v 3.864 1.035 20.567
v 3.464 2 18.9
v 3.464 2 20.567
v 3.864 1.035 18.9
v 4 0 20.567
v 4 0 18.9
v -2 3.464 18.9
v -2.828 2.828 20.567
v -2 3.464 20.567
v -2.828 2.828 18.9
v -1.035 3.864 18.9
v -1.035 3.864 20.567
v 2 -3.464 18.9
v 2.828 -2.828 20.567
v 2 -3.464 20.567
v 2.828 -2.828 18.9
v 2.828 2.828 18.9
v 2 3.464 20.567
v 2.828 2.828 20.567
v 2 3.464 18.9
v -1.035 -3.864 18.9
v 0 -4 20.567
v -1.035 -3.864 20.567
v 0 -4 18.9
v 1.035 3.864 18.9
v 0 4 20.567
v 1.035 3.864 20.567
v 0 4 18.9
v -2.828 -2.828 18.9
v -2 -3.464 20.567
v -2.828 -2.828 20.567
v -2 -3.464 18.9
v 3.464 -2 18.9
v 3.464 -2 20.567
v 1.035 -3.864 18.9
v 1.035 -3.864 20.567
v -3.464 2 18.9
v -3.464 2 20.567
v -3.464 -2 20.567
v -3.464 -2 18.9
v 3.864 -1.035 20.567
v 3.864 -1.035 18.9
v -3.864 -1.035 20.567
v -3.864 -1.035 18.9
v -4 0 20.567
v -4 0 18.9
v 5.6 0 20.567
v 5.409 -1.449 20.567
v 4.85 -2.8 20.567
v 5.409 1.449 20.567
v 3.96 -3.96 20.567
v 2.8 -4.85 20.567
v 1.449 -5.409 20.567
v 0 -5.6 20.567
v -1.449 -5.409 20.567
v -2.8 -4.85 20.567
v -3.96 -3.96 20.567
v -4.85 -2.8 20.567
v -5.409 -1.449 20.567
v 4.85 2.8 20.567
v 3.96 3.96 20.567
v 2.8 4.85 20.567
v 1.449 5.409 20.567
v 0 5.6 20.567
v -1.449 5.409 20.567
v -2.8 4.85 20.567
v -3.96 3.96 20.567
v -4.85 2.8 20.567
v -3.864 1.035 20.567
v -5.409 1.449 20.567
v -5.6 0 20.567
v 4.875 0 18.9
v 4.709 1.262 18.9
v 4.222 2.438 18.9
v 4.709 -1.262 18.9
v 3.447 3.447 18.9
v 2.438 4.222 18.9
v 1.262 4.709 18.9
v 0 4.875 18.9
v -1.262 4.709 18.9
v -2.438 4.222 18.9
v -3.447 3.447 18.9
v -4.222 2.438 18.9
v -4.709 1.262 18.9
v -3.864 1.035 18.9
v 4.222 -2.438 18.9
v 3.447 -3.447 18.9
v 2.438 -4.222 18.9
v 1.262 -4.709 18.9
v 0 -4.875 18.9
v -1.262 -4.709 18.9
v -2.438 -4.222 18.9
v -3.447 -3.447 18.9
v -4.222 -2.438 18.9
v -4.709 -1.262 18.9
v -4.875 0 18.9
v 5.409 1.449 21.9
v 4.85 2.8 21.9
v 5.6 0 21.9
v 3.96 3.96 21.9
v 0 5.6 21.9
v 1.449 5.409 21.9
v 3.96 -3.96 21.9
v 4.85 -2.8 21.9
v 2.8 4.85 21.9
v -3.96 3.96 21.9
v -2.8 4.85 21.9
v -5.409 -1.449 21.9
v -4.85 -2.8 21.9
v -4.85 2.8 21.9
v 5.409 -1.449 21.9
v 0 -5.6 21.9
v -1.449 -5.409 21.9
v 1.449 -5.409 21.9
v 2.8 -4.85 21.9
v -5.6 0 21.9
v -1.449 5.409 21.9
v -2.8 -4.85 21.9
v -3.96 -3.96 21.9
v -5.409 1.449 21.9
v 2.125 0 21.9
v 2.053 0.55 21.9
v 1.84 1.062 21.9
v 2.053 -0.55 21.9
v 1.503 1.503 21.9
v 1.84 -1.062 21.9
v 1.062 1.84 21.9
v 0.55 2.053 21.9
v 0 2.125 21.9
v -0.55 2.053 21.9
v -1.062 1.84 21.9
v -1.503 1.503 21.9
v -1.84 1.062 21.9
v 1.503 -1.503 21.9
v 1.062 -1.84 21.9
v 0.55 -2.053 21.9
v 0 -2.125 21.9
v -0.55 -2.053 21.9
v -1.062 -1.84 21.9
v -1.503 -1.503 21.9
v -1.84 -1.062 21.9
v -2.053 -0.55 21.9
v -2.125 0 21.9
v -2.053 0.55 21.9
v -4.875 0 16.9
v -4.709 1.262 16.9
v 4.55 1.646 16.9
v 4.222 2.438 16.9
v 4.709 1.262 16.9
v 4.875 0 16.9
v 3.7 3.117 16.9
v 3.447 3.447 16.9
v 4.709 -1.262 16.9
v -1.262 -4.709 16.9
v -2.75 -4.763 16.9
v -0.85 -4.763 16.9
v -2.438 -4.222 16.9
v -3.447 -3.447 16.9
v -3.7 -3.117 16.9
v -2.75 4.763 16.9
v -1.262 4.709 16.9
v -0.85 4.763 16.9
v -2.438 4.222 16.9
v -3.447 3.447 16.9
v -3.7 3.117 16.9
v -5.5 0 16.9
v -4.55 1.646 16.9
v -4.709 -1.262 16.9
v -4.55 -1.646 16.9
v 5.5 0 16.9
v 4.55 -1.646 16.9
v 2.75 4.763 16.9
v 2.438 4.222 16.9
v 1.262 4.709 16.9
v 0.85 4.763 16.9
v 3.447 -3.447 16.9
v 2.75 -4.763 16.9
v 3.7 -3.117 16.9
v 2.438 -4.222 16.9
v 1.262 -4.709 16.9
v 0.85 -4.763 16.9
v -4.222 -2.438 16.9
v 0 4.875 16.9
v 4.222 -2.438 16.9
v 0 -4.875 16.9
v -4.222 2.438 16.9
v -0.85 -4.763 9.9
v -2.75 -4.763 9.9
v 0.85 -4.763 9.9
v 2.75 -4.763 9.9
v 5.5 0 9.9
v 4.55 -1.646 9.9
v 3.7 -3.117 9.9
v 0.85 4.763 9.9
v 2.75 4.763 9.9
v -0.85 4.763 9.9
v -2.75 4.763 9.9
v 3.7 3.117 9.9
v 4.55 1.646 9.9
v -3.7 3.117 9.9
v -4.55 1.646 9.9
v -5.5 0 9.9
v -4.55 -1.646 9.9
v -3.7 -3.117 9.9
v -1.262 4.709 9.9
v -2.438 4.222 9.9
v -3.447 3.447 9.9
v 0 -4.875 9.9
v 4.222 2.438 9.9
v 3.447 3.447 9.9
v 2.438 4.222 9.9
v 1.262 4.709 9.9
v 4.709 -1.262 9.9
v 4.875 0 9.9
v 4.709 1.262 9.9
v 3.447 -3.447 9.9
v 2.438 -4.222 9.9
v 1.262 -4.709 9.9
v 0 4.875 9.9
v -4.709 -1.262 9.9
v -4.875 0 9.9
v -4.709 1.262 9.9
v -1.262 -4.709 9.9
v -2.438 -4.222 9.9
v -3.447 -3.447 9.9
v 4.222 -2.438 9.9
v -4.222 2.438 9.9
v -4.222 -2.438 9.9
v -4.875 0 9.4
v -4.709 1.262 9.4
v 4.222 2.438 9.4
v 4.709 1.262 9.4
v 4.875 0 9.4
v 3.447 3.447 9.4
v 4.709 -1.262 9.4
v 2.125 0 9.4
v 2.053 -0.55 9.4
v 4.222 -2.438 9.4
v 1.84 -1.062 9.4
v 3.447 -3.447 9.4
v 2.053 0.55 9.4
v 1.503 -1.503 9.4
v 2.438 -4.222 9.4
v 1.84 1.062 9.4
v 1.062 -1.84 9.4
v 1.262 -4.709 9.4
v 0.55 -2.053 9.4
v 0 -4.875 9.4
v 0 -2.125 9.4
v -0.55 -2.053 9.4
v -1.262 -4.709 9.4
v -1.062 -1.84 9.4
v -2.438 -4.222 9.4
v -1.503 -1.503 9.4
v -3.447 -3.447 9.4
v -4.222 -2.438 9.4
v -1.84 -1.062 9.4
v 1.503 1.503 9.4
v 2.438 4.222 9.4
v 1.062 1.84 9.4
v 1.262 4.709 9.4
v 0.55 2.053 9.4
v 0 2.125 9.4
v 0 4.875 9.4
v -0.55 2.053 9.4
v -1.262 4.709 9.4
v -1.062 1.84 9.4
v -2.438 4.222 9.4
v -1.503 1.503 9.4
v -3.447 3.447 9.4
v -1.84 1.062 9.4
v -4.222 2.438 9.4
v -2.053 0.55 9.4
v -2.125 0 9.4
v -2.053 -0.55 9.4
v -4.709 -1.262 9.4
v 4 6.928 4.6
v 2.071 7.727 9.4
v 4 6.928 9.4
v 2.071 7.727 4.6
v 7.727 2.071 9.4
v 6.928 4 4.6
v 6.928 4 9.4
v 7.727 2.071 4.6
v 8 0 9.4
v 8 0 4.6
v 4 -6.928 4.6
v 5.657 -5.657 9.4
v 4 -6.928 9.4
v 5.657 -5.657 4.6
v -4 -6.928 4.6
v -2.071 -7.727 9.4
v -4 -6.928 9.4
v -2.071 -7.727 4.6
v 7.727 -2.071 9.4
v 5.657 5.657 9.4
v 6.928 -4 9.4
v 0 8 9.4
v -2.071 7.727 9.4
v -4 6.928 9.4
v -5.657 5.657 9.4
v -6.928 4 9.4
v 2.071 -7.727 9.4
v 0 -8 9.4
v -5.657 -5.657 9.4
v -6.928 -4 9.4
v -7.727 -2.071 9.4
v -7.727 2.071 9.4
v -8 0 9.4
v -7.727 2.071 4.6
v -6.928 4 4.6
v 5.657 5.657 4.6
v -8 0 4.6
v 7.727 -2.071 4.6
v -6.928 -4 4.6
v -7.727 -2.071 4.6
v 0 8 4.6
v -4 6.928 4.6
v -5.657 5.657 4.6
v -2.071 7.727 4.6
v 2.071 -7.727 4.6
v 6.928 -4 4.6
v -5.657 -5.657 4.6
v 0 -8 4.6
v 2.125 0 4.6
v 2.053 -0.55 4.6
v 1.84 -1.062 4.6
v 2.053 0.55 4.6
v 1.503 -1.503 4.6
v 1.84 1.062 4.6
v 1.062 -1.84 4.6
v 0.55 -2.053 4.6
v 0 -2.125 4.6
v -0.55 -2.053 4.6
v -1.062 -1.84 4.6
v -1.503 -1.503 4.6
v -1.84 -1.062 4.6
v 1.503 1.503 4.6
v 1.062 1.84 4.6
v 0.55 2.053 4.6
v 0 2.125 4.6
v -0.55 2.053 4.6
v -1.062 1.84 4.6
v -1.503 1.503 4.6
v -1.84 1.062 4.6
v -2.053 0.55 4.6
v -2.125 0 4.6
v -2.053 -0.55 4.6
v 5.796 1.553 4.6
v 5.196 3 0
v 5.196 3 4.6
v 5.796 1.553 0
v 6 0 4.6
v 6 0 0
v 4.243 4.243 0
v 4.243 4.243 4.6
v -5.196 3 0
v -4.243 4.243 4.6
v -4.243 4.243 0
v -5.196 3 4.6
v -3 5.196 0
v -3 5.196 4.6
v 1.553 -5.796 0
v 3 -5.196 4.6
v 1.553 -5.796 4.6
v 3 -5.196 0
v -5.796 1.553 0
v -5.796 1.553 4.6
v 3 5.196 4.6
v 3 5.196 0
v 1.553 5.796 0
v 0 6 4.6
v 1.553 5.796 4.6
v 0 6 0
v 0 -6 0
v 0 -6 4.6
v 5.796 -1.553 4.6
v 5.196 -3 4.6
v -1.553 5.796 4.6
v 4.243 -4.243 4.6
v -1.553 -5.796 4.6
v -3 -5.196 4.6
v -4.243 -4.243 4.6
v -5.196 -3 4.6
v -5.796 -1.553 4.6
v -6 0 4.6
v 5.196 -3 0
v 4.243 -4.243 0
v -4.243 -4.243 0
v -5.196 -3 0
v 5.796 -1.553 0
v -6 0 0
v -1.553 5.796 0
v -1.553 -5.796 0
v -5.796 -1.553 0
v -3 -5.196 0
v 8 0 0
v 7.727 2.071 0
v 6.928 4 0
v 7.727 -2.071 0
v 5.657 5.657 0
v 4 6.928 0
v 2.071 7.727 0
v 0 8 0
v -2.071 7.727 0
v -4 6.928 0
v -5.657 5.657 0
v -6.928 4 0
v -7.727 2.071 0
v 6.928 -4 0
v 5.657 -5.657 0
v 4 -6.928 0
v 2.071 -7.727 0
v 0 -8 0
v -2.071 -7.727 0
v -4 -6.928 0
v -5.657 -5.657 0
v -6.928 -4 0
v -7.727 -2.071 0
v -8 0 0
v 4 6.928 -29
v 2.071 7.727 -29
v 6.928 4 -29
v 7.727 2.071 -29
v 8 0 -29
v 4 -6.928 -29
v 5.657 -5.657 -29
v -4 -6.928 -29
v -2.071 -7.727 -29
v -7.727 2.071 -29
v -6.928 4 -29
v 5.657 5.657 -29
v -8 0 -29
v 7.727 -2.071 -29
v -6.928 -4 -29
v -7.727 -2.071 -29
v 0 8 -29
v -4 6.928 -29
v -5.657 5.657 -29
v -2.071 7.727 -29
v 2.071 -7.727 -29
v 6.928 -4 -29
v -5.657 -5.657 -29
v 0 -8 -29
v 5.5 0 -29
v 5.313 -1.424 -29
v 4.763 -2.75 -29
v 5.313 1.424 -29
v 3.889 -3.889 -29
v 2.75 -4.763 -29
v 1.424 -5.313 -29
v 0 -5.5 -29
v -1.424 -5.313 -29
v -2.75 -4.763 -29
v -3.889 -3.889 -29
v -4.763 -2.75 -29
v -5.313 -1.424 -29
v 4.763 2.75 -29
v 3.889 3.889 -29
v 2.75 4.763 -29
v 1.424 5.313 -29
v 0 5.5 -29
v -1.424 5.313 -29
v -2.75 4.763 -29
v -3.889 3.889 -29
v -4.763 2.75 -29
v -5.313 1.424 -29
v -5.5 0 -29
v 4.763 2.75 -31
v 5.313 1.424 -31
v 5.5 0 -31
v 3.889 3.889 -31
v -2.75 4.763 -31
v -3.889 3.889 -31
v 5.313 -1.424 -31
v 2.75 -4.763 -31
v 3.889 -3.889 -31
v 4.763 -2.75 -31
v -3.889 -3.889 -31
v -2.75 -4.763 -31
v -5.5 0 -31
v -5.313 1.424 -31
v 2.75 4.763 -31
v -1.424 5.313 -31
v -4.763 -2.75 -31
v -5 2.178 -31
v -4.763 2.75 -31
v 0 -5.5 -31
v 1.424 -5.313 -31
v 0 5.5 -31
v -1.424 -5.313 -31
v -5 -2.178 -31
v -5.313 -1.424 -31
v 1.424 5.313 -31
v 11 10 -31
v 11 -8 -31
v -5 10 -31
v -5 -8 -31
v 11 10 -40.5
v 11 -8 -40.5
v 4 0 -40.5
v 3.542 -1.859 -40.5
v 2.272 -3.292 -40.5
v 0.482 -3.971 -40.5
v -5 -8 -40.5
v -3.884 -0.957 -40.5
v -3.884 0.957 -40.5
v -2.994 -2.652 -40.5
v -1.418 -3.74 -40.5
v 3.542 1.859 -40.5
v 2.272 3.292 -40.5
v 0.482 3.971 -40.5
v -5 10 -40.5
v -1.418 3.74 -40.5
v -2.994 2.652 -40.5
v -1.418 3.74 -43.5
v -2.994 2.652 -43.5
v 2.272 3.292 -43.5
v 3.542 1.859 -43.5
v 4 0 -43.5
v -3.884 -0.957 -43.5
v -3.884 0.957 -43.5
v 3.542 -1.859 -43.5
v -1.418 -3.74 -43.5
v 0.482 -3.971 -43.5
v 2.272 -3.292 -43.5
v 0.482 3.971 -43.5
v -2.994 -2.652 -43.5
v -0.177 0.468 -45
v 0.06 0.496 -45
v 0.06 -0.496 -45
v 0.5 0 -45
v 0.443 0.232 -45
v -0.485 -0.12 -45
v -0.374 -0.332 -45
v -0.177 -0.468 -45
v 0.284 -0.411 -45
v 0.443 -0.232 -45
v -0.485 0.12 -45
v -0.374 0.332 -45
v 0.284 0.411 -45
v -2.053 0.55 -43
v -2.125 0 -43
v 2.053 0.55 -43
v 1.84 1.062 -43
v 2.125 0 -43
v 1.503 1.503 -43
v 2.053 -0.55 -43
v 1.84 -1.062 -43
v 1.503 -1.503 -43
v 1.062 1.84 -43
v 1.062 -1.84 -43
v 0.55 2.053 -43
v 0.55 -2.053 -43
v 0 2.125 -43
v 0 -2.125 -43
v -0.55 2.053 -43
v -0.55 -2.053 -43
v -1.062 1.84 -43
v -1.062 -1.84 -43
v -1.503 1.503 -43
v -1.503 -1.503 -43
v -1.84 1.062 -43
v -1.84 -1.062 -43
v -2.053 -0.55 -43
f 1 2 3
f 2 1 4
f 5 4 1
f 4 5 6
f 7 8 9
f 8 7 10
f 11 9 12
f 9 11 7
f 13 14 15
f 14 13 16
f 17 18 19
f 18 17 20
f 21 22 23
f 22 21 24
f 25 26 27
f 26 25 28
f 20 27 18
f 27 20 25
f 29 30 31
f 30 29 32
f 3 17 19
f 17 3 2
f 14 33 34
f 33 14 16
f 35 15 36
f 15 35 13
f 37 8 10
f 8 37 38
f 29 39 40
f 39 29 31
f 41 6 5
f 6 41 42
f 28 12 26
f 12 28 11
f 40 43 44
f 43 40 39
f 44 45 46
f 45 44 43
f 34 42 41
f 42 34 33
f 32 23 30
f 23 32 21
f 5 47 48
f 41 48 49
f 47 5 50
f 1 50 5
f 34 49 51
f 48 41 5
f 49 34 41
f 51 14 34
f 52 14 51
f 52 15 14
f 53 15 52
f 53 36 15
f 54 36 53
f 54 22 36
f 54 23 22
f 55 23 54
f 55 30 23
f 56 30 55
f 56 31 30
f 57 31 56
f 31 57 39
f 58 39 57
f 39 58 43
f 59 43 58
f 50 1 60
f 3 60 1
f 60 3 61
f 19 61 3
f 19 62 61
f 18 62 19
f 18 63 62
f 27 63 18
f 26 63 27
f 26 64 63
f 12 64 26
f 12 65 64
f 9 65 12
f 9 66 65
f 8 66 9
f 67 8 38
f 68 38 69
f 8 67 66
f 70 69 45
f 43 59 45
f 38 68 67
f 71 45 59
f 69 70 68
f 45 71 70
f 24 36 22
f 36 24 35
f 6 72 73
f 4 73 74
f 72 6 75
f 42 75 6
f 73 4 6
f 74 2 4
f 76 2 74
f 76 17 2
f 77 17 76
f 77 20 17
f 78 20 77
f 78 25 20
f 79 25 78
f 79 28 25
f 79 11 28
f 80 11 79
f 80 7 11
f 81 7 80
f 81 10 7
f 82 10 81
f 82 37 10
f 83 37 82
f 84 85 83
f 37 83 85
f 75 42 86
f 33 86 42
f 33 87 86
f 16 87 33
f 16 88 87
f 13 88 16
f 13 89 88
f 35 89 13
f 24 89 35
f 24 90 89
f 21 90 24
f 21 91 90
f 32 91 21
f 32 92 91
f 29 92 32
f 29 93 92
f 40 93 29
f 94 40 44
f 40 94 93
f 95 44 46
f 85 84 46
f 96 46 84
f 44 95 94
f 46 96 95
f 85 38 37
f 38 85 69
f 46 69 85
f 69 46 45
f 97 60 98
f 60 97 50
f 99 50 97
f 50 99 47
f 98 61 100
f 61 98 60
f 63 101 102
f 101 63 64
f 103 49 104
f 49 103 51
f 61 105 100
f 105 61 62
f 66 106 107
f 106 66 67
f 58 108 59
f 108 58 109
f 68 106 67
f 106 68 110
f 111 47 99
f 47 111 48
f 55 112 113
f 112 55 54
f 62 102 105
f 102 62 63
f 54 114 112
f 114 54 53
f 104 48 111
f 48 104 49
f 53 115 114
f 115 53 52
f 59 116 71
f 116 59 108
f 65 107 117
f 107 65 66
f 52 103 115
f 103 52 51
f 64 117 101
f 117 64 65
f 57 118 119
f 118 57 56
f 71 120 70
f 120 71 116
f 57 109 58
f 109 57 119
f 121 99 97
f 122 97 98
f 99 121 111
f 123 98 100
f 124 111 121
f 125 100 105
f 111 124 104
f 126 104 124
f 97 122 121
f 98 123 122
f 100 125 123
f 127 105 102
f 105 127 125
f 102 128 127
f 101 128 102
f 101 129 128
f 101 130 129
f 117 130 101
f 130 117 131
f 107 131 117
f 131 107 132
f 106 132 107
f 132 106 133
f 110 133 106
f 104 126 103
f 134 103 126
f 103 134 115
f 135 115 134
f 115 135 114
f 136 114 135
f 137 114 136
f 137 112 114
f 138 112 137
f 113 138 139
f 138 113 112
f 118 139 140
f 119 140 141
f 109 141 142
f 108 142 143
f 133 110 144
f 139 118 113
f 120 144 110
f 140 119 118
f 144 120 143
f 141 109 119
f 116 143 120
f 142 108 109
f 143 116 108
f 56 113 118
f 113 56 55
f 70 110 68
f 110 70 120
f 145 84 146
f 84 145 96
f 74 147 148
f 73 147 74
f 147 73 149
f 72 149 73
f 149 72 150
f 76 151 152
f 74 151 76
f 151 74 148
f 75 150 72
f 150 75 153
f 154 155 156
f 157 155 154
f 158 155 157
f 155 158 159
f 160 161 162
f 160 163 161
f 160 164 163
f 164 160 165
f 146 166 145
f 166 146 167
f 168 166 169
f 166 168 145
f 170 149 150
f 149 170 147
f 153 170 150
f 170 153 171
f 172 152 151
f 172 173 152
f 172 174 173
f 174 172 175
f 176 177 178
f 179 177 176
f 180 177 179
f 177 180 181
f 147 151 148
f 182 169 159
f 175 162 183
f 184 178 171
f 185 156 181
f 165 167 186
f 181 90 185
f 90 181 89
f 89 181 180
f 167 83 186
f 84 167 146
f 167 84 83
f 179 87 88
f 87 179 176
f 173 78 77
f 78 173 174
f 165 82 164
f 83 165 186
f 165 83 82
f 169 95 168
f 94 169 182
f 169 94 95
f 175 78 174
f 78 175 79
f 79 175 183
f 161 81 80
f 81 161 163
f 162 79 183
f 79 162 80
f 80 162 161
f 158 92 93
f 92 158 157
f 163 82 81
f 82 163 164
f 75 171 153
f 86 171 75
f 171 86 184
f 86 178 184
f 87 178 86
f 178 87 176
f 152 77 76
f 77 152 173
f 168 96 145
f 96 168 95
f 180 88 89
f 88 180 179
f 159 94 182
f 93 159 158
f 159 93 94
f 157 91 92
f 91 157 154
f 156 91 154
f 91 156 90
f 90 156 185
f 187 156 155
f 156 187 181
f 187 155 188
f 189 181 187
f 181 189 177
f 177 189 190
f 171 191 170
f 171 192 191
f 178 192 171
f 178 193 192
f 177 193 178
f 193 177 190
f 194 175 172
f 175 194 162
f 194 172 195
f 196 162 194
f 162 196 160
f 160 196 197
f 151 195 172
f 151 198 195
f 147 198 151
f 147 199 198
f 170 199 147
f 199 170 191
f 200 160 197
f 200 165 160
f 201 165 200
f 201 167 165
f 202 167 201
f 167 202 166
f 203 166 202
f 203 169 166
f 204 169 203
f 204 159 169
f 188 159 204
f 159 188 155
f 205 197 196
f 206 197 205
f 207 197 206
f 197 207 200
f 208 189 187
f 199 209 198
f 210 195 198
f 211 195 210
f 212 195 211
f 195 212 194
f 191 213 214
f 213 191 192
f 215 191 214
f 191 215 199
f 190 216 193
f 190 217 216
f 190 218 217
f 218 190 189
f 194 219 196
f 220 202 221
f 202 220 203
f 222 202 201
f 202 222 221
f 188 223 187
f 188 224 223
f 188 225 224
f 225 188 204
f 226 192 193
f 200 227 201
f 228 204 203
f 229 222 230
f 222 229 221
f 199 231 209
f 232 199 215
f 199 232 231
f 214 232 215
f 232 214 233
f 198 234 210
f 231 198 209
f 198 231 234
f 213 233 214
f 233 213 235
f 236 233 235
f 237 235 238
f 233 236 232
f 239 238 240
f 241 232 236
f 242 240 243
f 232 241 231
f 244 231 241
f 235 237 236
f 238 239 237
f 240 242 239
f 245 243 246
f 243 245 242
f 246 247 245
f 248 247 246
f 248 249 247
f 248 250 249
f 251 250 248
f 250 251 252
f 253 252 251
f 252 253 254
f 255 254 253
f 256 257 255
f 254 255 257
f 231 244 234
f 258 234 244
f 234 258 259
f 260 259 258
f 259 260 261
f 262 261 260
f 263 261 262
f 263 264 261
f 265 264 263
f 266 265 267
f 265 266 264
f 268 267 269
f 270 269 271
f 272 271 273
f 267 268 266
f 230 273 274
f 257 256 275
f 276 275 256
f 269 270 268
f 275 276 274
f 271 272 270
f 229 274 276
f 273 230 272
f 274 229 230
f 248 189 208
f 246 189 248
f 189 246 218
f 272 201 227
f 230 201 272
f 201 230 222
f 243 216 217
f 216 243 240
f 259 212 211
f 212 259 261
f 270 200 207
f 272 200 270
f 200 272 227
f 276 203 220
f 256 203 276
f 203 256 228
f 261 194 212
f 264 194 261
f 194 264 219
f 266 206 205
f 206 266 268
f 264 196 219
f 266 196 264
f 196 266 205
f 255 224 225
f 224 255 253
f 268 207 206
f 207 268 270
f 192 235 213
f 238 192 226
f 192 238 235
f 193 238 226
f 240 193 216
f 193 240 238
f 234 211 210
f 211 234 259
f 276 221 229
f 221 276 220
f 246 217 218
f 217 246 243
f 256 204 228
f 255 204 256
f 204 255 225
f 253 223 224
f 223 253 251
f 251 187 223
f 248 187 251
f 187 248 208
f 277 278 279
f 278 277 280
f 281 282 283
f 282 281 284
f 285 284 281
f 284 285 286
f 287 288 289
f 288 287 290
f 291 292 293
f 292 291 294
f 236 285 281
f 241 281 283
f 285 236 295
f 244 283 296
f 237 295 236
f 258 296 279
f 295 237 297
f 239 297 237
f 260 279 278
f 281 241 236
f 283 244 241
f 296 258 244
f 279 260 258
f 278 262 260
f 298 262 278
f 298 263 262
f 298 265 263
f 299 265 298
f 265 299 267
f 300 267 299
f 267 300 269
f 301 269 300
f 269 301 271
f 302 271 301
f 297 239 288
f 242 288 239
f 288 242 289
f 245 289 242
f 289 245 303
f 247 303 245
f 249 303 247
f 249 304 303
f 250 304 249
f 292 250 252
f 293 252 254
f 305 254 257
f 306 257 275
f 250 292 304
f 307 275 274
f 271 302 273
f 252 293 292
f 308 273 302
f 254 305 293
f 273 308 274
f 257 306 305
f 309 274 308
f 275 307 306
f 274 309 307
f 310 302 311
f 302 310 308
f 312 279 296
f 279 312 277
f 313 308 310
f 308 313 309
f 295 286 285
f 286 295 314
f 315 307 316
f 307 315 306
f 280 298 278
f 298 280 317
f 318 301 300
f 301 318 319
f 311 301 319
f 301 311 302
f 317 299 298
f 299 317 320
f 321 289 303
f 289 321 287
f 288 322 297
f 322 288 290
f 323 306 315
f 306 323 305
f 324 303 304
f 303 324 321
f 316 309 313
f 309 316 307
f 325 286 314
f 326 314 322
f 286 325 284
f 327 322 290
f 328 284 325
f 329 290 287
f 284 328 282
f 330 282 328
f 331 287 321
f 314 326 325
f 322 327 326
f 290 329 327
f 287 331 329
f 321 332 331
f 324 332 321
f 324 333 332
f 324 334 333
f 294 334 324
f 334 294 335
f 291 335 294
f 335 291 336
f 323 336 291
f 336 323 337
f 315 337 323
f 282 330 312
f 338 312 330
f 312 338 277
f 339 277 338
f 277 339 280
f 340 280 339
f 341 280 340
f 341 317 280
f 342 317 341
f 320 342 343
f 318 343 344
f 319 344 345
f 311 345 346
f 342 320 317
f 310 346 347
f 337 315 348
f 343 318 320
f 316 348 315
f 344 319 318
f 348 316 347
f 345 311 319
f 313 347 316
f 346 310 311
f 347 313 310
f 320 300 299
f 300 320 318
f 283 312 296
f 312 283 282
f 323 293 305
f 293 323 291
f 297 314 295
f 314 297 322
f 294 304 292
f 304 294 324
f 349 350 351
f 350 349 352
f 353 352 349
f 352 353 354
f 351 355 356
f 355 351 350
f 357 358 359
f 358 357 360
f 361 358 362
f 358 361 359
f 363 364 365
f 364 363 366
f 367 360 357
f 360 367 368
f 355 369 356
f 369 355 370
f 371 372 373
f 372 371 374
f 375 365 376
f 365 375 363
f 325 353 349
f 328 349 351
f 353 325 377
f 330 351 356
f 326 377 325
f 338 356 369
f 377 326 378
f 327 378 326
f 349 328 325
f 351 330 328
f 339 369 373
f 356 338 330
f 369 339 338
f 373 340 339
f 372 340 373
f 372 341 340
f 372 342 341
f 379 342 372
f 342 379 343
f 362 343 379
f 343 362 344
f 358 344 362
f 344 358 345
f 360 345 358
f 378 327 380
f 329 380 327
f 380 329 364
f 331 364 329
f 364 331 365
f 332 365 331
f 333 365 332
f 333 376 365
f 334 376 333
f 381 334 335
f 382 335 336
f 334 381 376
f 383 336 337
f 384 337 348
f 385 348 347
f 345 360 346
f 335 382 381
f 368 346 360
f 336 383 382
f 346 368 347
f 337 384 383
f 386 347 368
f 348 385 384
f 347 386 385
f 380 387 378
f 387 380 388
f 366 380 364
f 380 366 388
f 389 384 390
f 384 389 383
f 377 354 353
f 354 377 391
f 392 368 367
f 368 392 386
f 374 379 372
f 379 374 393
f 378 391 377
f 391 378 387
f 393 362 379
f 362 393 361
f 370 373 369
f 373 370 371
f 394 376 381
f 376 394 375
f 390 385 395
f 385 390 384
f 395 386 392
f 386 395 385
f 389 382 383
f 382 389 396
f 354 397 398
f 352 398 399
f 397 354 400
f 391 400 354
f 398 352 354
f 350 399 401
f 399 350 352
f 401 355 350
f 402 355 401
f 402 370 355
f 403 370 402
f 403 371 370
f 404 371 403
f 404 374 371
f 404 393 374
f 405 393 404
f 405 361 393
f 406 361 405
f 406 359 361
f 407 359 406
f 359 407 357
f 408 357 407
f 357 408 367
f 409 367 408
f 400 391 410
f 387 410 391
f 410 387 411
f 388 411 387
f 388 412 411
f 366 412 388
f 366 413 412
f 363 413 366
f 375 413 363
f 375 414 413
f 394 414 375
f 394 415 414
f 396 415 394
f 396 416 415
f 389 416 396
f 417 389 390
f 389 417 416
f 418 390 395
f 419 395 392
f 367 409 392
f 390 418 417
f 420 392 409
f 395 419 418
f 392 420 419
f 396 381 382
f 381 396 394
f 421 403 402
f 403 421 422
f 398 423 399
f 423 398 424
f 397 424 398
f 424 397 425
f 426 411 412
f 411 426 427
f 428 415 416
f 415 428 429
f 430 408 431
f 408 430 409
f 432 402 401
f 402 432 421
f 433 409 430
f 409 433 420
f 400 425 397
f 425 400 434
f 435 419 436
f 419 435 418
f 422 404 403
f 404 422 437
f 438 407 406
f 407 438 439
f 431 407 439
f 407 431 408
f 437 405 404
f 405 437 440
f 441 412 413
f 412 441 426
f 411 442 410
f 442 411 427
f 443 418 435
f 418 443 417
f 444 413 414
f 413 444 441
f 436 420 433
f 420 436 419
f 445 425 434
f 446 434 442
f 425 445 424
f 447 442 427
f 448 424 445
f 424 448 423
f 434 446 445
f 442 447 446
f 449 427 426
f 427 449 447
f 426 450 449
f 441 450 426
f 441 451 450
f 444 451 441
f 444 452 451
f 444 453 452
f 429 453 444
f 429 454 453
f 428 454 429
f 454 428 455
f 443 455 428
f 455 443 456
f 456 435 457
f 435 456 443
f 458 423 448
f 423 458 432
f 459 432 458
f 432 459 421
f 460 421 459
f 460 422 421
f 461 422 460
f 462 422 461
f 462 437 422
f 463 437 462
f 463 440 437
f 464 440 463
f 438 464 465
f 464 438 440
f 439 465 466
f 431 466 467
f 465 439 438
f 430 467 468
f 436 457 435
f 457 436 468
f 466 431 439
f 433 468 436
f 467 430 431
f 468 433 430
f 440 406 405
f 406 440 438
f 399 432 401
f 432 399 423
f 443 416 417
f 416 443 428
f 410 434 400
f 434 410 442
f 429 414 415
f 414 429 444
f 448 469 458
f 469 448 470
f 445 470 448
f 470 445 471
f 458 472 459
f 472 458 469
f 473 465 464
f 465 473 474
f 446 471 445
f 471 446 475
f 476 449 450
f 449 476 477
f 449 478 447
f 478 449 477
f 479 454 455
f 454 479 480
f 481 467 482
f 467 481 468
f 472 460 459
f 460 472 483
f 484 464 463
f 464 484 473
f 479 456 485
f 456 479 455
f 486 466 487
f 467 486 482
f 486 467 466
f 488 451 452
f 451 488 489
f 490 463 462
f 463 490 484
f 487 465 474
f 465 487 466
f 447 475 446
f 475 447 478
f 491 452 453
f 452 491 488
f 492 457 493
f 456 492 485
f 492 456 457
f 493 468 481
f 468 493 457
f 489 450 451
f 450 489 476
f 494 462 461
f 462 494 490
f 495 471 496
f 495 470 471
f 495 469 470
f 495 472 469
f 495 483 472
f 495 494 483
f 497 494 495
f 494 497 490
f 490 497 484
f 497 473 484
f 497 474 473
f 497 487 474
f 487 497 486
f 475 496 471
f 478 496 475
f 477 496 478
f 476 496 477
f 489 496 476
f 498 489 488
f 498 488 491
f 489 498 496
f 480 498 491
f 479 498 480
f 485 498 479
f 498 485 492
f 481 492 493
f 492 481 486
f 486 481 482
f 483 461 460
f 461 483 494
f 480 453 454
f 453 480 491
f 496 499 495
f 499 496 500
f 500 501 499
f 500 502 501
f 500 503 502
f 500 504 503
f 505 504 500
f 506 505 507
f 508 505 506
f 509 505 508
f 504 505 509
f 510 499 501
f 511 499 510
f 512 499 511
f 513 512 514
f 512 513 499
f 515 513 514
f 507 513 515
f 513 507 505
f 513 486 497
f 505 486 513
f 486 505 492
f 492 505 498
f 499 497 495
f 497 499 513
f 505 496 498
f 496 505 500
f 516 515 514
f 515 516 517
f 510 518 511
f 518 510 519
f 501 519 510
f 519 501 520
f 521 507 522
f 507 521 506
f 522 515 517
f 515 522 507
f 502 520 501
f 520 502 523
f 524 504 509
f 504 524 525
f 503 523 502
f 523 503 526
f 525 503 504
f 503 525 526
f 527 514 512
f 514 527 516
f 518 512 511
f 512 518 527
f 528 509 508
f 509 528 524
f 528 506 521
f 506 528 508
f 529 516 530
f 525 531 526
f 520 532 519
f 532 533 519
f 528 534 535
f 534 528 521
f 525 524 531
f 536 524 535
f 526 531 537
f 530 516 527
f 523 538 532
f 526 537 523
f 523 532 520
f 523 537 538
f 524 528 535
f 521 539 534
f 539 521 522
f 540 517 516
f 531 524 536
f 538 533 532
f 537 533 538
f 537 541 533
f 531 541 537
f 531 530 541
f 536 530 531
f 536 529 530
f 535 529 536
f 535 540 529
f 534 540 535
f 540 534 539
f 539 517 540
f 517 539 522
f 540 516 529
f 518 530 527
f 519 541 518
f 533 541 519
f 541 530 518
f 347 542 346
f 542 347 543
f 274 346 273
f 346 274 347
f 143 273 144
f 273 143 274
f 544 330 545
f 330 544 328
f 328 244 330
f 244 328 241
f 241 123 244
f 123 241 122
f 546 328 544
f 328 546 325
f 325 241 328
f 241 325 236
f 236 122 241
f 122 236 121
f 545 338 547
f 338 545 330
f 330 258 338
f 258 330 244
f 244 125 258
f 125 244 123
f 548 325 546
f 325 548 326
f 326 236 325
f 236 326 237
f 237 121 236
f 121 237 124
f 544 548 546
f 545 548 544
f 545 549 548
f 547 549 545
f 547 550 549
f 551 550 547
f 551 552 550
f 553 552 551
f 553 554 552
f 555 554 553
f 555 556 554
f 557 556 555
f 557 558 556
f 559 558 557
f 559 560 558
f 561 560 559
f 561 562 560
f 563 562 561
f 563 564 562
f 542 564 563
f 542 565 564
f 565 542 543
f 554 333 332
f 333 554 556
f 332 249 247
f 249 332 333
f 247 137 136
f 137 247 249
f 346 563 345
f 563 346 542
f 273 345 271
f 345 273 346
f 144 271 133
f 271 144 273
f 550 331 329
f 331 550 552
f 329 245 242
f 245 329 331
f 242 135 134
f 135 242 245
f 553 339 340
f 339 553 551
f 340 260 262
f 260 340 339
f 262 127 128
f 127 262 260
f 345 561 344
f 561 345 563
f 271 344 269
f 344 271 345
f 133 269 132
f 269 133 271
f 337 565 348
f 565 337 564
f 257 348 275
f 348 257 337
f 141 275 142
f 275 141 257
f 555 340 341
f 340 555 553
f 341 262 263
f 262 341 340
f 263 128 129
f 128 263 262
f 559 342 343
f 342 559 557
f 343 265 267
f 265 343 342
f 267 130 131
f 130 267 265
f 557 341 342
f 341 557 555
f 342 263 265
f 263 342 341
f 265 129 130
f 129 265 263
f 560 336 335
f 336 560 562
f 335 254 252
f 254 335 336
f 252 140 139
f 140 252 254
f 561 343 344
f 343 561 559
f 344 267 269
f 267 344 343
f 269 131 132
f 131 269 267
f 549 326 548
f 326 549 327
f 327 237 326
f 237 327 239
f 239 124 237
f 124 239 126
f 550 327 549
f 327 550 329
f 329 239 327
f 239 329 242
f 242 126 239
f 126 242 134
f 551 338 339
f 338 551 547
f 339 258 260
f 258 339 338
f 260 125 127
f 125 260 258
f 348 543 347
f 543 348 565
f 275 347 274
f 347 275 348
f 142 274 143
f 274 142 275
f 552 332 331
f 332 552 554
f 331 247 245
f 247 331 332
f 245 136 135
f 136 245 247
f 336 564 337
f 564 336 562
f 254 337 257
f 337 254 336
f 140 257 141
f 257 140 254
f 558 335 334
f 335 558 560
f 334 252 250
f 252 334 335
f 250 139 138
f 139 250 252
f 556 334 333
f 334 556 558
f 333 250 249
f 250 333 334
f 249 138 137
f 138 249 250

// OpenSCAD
// file: utility.scad
//
// Copyright (C) 2015, Jason S. McMullan <jason.mcmullan@gmail.com>
// All right reserved.
//
// Licensed under the MIT License:
//
// Permission is hereby granted, free of charge, to any person obtaining
// a copy of this software and associated documentation files (the "Software"),
// to deal in the Software without restriction, including without limitation
// the rights to use, copy, modify, merge, publish, distribute, sublicense,
// and/or sell copies of the Software, and to permit persons to whom the
// Software is furnished to do so, subject to the following conditions:
//
// The above copyright notice and this permission notice shall be included
// in all copies or substantial portions of the Software.
//
// THE SOFTWARE IS PROVIDED "AS IS", WITHOUT WARRANTY OF ANY KIND, EXPRESS OR
// IMPLIED, INCLUDING BUT NOT LIMITED TO THE WARRANTIES OF MERCHANTABILITY,
// FITNESS FOR A PARTICULAR PURPOSE AND NONINFRINGEMENT. IN NO EVENT SHALL THE
// AUTHORS OR COPYRIGHT HOLDERS BE LIABLE FOR ANY CLAIM, DAMAGES OR OTHER
// LIABILITY, WHETHER IN AN ACTION OF CONTRACT, TORT OR OTHERWISE, ARISING
// FROM, OUT OF OR IN CONNECTION WITH THE SOFTWARE OR THE USE OR OTHER
// DEALINGS IN THE SOFTWARE.
//

mm = 1;

// Tolerance for through-bolt drills
drill_tolerance=0.25 * mm;

module drill(d=3, h=1, tolerance=drill_tolerance, fn = 60)
{
    translate([0, 0, -0.1]) cylinder(d=d + tolerance*2, h=h+0.2, $fn =fn);
}

// Like the towers of hanoi, this adds a cylinder, then calls
// children() to stack another on top. Useful for modelling J-Heads
module utility_hanoi(d=1, h=1, fn=24)
{
    cylinder(d=d, h=h, $fn=fn);
    translate([0, 0, h])
        children();
}


// make a plate with mitred edges
module utility_plate_mitred_edge(size=[20, 30, 4], radius=4)
{
    hull() {
        translate([-(size[0]/2-radius), (size[1]/2-radius)])
            cylinder(r=radius, h=size[2], $fn=24);
        translate([-(size[0]/2-radius), -(size[1]/2-radius)])
            cylinder(r=radius, h=size[2], $fn=24);
        translate([(size[0]/2-radius), (size[1]/2-radius)])
            cylinder(r=radius, h=size[2], $fn=24);
        translate([(size[0]/2-radius), -(size[1]/2-radius)])
            cylinder(r=radius, h=size[2], $fn=24);
    }
}

module utility_plate_mitred_top(size=[20, 30, 20], radius=4)
{
    translate([-size[0]/2, -size[1]/2, 0])
    hull() {
        cube([size[0], size[1], size[2] - radius]);
        translate([radius, 0, size[2] - radius])
            rotate([-90, 0, 0]) {
                cylinder(r=radius, h=size[1]);
                translate([size[0]-radius*2, 0, 0])
                    cylinder(r=radius, h=size[1]);
        }
    }
}

// make a cylinder or torus a mitred top
module utility_torus_mitred_top(id=10, od=40, height=8, radius=2, hole = true)
{
    rotate_extrude() {
        hull()
        {
            translate([id/2+radius, height-radius]) circle(r=radius,$fn=24);
            translate([od/2-radius, height-radius]) circle(r=radius,$fn=24);
            if (hole)
                translate([id/2,0]) square([(od-id)/2, height-radius]);
            else
                square([od/2, height]);
        }
    }
}

// vim: set shiftwidth=4 expandtab: //
// main file
//
// Copyright (C) 2015, Jason S. McMullan <jason.mcmullan@gmail.com>
// All right reserved.
//
// Licensed under the MIT License:
//
// Permission is hereby granted, free of charge, to any person obtaining
// a copy of this software and associated documentation files (the "Software"),
// to deal in the Software without restriction, including without limitation
// the rights to use, copy, modify, merge, publish, distribute, sublicense,
// and/or sell copies of the Software, and to permit persons to whom the
// Software is furnished to do so, subject to the following conditions:
//
// The above copyright notice and this permission notice shall be included
// in all copies or substantial portions of the Software.
//
// THE SOFTWARE IS PROVIDED "AS IS", WITHOUT WARRANTY OF ANY KIND, EXPRESS OR
// IMPLIED, INCLUDING BUT NOT LIMITED TO THE WARRANTIES OF MERCHANTABILITY,
// FITNESS FOR A PARTICULAR PURPOSE AND NONINFRINGEMENT. IN NO EVENT SHALL THE
// AUTHORS OR COPYRIGHT HOLDERS BE LIABLE FOR ANY CLAIM, DAMAGES OR OTHER
// LIABILITY, WHETHER IN AN ACTION OF CONTRACT, TORT OR OTHERWISE, ARISING
// FROM, OUT OF OR IN CONNECTION WITH THE SOFTWARE OR THE USE OR OTHER
// DEALINGS IN THE SOFTWARE.
//
// All units are in mm

use <utility.scad>

module geeetech_jhead_peek_nozzle()
{
    cylinder(d1=1, d2=8, h=1.5);
    translate([0, 0, 1.5]) {
        cylinder(d=8, h=3);
        translate([0, 0, 3]) {
            translate([-5, -8])
                cube([16, 18, 9.5]);
            translate([0, 0, 9.5])
                children();
        }
    }
}

// Origin is bottom center of J-Head lock ring
module geeetech_jhead_peek()
{
    translate([0, 0, -45])
        difference() {
            geeetech_jhead_peek_nozzle()
            utility_hanoi(d=11, h=2)
            utility_hanoi(d=16, h=29)
            utility_hanoi(d=12, h=4.6)
            utility_hanoi(d=16, h=4.8)
            utility_hanoi(d=9.75, h=0.5)
            utility_hanoi(d=11, h=7, fn=6)
            utility_hanoi(d=9.75, h=2)
            utility_hanoi(d=8, h=1+2/3)
            utility_hanoi(d=11.2, h=1+1/3);

            translate([0, 0, 2])
                cylinder(d=4.25, h=67.2, $fn=24);
        }
}

geeetech_jhead_peek();
// vim: set shiftwidth=4 expandtab: //
